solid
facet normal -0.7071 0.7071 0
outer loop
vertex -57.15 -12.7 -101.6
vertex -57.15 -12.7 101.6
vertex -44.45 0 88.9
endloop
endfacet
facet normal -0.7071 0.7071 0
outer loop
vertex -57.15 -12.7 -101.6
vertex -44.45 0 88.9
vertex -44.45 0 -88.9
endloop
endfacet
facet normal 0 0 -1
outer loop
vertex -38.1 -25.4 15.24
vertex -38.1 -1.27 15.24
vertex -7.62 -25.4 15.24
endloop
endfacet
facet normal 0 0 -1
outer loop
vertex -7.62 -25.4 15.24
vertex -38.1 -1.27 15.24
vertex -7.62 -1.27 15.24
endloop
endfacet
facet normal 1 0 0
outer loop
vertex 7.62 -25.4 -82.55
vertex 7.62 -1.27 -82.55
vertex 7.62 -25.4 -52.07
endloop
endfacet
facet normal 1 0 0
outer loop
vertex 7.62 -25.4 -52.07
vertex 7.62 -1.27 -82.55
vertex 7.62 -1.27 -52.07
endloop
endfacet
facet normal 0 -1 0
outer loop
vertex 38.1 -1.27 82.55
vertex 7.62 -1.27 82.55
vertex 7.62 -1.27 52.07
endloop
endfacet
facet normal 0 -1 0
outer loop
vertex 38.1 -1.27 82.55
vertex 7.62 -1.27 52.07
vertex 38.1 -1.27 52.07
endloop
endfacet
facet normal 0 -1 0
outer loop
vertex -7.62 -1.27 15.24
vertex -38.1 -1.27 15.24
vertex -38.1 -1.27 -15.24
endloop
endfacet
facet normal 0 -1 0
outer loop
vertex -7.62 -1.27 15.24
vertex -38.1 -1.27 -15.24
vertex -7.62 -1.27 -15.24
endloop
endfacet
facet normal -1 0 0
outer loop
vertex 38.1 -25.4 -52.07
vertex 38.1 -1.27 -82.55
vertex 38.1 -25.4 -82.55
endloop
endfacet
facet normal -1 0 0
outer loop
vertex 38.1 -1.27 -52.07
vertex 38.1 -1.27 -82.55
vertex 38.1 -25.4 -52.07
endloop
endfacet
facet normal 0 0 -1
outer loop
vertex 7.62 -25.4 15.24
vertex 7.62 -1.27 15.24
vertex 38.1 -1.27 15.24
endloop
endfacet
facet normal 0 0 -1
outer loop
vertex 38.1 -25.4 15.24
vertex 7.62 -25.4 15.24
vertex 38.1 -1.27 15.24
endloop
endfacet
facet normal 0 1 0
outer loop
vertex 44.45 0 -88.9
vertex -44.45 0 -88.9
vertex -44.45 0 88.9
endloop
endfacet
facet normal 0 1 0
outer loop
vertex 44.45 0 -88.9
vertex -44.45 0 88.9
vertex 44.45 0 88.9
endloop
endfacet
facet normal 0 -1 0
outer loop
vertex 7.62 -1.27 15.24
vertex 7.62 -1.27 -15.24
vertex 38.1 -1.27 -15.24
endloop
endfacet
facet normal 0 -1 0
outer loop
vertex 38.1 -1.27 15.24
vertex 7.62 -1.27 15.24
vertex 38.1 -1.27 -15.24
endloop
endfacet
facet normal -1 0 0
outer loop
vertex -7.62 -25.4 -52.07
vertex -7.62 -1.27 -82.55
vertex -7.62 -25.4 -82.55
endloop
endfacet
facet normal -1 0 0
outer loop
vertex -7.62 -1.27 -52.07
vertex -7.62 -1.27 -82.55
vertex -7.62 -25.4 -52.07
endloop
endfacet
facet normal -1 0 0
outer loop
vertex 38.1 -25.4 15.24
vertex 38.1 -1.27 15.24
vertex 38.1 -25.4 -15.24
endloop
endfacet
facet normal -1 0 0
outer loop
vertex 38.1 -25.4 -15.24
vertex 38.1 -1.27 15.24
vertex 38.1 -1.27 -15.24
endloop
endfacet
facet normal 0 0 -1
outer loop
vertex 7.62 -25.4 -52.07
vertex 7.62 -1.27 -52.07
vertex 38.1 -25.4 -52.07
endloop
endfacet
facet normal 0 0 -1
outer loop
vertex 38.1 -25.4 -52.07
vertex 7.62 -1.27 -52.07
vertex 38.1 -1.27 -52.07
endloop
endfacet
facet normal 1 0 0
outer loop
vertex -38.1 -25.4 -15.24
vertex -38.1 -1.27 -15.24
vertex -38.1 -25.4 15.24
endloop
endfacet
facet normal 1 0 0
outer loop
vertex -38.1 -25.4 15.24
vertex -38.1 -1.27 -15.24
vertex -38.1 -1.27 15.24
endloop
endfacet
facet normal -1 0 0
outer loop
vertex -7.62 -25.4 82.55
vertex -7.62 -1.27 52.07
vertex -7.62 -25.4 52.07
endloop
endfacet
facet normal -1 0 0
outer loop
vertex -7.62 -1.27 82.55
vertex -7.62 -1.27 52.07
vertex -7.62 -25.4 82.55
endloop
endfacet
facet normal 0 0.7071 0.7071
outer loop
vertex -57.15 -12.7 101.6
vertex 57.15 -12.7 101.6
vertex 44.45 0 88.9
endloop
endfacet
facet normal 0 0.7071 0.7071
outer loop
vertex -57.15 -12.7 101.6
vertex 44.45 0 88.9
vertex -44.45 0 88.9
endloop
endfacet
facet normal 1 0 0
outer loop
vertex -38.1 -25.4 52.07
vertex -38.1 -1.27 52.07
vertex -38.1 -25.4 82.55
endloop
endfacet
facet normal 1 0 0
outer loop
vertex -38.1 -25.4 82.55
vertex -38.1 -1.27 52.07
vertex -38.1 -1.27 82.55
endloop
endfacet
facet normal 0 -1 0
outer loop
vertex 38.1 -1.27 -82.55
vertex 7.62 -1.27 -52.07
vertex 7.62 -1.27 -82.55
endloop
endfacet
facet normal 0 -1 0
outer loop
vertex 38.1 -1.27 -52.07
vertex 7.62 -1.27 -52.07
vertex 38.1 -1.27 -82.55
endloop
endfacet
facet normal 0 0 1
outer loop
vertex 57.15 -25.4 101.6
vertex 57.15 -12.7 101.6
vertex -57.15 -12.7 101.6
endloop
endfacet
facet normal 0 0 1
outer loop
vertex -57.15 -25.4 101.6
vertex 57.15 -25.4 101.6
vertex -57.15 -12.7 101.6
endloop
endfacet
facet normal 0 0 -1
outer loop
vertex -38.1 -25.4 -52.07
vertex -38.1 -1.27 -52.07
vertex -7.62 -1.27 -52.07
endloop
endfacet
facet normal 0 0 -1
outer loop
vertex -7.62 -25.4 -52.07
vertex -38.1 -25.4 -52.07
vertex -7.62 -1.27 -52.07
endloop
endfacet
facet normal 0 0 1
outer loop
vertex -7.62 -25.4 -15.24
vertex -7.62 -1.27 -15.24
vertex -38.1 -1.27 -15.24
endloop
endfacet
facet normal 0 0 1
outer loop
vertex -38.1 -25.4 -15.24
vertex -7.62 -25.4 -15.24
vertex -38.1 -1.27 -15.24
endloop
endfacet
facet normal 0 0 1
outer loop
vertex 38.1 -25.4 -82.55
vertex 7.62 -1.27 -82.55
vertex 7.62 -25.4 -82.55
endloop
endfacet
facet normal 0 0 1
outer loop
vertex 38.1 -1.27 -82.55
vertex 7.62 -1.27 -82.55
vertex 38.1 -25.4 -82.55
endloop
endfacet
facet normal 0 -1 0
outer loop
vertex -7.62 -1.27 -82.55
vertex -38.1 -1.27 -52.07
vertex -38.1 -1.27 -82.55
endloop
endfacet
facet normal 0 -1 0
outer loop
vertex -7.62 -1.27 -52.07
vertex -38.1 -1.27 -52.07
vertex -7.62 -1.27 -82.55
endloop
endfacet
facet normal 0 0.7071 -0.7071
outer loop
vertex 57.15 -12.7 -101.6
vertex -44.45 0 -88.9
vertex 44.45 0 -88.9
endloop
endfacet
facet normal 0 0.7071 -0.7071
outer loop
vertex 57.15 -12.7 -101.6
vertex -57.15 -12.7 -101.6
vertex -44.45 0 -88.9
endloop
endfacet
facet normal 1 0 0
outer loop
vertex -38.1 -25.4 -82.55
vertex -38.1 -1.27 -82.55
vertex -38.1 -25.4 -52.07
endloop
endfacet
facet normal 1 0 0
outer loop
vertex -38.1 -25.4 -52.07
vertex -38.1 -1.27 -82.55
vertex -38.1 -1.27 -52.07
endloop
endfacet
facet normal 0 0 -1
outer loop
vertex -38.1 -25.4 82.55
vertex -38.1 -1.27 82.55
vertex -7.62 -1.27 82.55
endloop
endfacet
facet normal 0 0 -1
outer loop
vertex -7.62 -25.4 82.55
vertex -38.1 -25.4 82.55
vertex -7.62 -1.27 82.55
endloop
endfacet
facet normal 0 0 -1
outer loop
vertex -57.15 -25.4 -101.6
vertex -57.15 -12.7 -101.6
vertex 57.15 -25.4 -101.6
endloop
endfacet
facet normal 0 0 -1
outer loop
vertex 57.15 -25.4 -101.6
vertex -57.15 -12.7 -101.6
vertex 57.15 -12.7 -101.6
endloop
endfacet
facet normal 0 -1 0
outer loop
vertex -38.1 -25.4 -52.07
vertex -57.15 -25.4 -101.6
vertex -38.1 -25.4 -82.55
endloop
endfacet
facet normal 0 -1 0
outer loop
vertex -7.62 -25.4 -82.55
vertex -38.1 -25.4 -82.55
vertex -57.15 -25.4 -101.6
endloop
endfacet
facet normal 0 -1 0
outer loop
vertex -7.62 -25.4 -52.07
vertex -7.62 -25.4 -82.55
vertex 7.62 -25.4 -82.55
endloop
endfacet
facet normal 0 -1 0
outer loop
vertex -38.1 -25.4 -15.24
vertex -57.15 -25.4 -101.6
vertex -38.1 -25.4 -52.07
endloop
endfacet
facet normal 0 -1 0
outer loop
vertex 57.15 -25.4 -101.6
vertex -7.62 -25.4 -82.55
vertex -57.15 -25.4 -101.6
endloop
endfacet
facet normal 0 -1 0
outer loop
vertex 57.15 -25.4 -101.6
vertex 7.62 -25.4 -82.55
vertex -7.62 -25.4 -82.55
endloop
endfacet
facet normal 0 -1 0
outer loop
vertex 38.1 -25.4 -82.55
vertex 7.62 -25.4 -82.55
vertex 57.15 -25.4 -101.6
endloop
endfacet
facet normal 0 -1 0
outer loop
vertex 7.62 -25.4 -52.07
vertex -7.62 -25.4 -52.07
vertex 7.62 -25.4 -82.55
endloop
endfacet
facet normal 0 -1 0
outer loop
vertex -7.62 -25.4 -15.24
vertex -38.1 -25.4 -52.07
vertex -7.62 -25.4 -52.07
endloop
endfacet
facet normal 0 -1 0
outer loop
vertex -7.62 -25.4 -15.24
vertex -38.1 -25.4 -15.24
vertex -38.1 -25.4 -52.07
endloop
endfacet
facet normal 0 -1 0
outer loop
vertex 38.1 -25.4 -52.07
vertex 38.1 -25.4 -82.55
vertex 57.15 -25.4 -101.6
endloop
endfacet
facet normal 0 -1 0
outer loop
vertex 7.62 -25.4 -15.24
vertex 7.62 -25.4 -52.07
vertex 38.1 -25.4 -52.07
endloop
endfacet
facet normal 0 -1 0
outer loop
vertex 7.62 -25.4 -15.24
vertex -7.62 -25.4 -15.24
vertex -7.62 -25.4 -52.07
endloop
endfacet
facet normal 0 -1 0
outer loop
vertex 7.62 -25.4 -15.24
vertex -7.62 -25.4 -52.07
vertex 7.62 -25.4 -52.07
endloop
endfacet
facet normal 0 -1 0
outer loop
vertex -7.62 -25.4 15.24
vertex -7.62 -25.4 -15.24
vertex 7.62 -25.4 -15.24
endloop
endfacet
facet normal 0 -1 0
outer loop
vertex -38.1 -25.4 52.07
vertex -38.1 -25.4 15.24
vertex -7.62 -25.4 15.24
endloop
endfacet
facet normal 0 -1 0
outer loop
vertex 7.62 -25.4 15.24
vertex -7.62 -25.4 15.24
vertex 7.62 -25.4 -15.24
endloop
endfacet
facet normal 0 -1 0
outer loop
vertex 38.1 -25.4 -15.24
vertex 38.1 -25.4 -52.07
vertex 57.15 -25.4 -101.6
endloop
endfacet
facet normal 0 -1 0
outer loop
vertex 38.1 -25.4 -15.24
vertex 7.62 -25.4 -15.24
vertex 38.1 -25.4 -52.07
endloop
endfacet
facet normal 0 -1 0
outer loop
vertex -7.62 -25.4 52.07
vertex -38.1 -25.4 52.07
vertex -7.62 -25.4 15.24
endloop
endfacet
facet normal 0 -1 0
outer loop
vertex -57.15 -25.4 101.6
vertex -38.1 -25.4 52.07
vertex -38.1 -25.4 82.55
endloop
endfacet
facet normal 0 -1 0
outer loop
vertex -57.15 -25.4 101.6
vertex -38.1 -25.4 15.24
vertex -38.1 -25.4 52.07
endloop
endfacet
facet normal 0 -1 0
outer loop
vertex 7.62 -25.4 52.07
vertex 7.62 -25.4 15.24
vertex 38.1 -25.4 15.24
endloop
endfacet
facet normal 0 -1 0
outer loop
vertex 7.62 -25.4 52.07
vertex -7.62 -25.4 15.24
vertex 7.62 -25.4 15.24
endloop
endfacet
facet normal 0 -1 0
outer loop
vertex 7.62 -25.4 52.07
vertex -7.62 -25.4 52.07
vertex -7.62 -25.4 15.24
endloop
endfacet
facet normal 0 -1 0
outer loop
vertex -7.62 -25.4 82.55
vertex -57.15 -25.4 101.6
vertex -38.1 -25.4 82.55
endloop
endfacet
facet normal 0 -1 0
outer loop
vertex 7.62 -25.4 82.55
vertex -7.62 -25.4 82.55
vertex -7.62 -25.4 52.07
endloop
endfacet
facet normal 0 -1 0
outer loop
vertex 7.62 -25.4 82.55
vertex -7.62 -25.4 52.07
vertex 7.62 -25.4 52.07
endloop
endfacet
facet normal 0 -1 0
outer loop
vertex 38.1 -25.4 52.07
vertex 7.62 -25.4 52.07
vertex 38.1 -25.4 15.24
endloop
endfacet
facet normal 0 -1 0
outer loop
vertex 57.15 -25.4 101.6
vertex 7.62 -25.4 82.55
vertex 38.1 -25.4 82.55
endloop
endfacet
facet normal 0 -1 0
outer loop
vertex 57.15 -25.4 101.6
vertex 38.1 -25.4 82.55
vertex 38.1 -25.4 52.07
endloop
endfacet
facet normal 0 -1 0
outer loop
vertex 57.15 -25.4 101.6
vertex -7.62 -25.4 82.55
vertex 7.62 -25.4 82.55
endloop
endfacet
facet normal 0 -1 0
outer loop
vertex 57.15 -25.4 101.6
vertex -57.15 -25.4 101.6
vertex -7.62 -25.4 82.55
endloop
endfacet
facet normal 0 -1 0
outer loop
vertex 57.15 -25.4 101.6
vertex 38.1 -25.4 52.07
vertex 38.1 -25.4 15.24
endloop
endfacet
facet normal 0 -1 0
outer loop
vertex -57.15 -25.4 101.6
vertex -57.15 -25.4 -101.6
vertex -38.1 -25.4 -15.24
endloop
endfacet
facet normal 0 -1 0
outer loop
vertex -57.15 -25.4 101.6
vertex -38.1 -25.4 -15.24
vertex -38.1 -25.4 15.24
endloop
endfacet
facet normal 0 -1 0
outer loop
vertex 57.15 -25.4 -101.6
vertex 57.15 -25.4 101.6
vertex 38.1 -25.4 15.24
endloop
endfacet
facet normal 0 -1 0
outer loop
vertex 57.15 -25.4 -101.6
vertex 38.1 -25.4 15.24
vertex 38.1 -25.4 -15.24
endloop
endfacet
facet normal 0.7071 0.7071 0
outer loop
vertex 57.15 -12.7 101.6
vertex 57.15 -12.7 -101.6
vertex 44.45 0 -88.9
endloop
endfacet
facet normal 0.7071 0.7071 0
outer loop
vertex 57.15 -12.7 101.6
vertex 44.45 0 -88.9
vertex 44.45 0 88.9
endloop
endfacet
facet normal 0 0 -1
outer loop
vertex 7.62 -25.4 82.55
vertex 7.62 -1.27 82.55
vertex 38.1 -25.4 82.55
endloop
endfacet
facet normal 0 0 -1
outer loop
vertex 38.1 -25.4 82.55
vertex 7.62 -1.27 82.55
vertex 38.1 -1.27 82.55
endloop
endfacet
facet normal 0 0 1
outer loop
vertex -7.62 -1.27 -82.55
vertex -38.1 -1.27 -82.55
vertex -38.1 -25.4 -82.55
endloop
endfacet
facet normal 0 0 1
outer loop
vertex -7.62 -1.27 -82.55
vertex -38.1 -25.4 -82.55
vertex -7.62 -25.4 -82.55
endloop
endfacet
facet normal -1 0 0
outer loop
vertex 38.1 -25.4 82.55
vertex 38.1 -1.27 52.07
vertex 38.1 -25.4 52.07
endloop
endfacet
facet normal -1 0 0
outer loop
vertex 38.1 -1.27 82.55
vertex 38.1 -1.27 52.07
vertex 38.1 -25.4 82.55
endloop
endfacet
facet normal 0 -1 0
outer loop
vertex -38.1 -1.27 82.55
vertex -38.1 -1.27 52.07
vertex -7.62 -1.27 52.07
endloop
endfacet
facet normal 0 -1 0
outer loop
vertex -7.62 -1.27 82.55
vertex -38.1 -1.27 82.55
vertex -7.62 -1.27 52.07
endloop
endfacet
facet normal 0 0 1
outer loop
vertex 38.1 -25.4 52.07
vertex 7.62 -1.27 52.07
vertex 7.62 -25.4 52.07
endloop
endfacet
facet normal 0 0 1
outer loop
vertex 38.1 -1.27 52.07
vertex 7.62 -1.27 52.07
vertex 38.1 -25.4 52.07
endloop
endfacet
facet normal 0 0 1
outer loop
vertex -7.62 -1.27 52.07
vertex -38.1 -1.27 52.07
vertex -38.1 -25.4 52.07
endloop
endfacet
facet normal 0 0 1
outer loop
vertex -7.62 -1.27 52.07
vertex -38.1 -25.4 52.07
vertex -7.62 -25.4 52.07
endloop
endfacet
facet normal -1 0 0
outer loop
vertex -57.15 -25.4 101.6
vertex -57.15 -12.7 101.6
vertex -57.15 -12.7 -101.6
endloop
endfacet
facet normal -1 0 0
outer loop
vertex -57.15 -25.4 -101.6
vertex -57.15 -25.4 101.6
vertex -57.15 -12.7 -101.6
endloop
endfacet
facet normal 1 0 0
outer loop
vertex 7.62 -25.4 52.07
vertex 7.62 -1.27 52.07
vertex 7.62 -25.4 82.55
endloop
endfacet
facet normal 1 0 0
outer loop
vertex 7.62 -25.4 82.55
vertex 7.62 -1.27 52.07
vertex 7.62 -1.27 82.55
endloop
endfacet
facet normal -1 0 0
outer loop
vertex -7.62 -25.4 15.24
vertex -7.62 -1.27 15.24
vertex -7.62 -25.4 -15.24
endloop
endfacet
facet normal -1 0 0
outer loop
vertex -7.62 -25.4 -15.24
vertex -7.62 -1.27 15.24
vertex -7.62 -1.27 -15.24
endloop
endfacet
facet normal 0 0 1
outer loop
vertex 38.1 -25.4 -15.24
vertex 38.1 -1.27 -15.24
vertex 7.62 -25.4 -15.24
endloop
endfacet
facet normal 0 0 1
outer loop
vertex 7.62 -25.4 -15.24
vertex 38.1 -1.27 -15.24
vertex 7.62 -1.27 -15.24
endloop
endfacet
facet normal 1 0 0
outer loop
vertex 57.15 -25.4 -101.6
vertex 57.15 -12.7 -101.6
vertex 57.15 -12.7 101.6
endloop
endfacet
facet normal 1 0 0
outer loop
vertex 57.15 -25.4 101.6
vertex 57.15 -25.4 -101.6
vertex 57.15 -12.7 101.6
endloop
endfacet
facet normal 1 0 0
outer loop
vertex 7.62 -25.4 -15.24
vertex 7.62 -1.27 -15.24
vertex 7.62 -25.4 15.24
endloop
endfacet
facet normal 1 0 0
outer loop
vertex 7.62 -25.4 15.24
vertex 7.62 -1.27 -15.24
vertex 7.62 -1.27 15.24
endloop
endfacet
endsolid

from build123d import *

# Parameters (mm, degrees)
F0_W     = 30.48
F0_H     = 30.48
F1_DEPTH = 25.4
F2_DEPTH = 1.27
F3_SIZE  = 12.7
F4_SIZE  = 12.7


with BuildPart() as f1:
    # F0 (on Front) → F1 (new body)
    with BuildSketch(Plane.XZ):
        Polygon((57.15, 82.55), (57.15, 101.6), (38.1, 101.6), (-38.1, 101.6), (-57.15, 101.6), (-57.15, 82.55), (-57.15, 0), (-57.15, -82.55), (-57.15, -101.6), (-38.1, -101.6), (38.1, -101.6), (57.15, -101.6), (57.15, -82.55), (57.15, 0), align=None)
        with Locations((-22.86, -67.31)):
            Rectangle(F0_W, F0_H, mode=Mode.SUBTRACT)
        Polygon((-38.1, -15.24), (-38.1, 0), (-38.1, 15.24), (-7.62, 15.24), (-7.62, -15.24), align=None, mode=Mode.SUBTRACT)
        with Locations((22.86, -67.31)):
            Rectangle(F0_W, F0_H, mode=Mode.SUBTRACT)
        Polygon((38.1, 15.24), (38.1, 0), (38.1, -15.24), (7.62, -15.24), (7.62, 15.24), align=None, mode=Mode.SUBTRACT)
        with Locations((-22.86, 67.31)):
            Rectangle(F0_W, F0_H, mode=Mode.SUBTRACT)
        with Locations((22.86, 67.31)):
            Rectangle(F0_W, F0_H, mode=Mode.SUBTRACT)
    extrude(amount=F1_DEPTH)

    # F0 (on Front) → F2 (join)
    with BuildSketch(Plane.XZ):
        with Locations((-22.86, 67.31)):
            Rectangle(F0_W, F0_H)
        with Locations((22.86, 67.31)):
            Rectangle(F0_W, F0_H)
        Polygon((-38.1, 15.24), (-38.1, 0), (-38.1, -15.24), (-7.62, -15.24), (-7.62, 15.24), align=None)
        Polygon((38.1, -15.24), (38.1, 0), (38.1, 15.24), (7.62, 15.24), (7.62, -15.24), align=None)
        with Locations((-22.86, -67.31)):
            Rectangle(F0_W, F0_H)
        with Locations((22.86, -67.31)):
            Rectangle(F0_W, F0_H)
    extrude(amount=F2_DEPTH)

    # F3
    f3_edges = [f1.edges().sort_by_distance(p)[0] for p in [
        (0, 0, -101.6),
    ]]
    chamfer(f3_edges, length=F3_SIZE)

    # F4
    f4_edges = [f1.edges().sort_by_distance(p)[0] for p in [
        (-57.15, 0, 6.35),
        (0, 0, 101.6),
        (57.15, 0, 6.35),
    ]]
    chamfer(f4_edges, length=F4_SIZE)


solid = f1.part
